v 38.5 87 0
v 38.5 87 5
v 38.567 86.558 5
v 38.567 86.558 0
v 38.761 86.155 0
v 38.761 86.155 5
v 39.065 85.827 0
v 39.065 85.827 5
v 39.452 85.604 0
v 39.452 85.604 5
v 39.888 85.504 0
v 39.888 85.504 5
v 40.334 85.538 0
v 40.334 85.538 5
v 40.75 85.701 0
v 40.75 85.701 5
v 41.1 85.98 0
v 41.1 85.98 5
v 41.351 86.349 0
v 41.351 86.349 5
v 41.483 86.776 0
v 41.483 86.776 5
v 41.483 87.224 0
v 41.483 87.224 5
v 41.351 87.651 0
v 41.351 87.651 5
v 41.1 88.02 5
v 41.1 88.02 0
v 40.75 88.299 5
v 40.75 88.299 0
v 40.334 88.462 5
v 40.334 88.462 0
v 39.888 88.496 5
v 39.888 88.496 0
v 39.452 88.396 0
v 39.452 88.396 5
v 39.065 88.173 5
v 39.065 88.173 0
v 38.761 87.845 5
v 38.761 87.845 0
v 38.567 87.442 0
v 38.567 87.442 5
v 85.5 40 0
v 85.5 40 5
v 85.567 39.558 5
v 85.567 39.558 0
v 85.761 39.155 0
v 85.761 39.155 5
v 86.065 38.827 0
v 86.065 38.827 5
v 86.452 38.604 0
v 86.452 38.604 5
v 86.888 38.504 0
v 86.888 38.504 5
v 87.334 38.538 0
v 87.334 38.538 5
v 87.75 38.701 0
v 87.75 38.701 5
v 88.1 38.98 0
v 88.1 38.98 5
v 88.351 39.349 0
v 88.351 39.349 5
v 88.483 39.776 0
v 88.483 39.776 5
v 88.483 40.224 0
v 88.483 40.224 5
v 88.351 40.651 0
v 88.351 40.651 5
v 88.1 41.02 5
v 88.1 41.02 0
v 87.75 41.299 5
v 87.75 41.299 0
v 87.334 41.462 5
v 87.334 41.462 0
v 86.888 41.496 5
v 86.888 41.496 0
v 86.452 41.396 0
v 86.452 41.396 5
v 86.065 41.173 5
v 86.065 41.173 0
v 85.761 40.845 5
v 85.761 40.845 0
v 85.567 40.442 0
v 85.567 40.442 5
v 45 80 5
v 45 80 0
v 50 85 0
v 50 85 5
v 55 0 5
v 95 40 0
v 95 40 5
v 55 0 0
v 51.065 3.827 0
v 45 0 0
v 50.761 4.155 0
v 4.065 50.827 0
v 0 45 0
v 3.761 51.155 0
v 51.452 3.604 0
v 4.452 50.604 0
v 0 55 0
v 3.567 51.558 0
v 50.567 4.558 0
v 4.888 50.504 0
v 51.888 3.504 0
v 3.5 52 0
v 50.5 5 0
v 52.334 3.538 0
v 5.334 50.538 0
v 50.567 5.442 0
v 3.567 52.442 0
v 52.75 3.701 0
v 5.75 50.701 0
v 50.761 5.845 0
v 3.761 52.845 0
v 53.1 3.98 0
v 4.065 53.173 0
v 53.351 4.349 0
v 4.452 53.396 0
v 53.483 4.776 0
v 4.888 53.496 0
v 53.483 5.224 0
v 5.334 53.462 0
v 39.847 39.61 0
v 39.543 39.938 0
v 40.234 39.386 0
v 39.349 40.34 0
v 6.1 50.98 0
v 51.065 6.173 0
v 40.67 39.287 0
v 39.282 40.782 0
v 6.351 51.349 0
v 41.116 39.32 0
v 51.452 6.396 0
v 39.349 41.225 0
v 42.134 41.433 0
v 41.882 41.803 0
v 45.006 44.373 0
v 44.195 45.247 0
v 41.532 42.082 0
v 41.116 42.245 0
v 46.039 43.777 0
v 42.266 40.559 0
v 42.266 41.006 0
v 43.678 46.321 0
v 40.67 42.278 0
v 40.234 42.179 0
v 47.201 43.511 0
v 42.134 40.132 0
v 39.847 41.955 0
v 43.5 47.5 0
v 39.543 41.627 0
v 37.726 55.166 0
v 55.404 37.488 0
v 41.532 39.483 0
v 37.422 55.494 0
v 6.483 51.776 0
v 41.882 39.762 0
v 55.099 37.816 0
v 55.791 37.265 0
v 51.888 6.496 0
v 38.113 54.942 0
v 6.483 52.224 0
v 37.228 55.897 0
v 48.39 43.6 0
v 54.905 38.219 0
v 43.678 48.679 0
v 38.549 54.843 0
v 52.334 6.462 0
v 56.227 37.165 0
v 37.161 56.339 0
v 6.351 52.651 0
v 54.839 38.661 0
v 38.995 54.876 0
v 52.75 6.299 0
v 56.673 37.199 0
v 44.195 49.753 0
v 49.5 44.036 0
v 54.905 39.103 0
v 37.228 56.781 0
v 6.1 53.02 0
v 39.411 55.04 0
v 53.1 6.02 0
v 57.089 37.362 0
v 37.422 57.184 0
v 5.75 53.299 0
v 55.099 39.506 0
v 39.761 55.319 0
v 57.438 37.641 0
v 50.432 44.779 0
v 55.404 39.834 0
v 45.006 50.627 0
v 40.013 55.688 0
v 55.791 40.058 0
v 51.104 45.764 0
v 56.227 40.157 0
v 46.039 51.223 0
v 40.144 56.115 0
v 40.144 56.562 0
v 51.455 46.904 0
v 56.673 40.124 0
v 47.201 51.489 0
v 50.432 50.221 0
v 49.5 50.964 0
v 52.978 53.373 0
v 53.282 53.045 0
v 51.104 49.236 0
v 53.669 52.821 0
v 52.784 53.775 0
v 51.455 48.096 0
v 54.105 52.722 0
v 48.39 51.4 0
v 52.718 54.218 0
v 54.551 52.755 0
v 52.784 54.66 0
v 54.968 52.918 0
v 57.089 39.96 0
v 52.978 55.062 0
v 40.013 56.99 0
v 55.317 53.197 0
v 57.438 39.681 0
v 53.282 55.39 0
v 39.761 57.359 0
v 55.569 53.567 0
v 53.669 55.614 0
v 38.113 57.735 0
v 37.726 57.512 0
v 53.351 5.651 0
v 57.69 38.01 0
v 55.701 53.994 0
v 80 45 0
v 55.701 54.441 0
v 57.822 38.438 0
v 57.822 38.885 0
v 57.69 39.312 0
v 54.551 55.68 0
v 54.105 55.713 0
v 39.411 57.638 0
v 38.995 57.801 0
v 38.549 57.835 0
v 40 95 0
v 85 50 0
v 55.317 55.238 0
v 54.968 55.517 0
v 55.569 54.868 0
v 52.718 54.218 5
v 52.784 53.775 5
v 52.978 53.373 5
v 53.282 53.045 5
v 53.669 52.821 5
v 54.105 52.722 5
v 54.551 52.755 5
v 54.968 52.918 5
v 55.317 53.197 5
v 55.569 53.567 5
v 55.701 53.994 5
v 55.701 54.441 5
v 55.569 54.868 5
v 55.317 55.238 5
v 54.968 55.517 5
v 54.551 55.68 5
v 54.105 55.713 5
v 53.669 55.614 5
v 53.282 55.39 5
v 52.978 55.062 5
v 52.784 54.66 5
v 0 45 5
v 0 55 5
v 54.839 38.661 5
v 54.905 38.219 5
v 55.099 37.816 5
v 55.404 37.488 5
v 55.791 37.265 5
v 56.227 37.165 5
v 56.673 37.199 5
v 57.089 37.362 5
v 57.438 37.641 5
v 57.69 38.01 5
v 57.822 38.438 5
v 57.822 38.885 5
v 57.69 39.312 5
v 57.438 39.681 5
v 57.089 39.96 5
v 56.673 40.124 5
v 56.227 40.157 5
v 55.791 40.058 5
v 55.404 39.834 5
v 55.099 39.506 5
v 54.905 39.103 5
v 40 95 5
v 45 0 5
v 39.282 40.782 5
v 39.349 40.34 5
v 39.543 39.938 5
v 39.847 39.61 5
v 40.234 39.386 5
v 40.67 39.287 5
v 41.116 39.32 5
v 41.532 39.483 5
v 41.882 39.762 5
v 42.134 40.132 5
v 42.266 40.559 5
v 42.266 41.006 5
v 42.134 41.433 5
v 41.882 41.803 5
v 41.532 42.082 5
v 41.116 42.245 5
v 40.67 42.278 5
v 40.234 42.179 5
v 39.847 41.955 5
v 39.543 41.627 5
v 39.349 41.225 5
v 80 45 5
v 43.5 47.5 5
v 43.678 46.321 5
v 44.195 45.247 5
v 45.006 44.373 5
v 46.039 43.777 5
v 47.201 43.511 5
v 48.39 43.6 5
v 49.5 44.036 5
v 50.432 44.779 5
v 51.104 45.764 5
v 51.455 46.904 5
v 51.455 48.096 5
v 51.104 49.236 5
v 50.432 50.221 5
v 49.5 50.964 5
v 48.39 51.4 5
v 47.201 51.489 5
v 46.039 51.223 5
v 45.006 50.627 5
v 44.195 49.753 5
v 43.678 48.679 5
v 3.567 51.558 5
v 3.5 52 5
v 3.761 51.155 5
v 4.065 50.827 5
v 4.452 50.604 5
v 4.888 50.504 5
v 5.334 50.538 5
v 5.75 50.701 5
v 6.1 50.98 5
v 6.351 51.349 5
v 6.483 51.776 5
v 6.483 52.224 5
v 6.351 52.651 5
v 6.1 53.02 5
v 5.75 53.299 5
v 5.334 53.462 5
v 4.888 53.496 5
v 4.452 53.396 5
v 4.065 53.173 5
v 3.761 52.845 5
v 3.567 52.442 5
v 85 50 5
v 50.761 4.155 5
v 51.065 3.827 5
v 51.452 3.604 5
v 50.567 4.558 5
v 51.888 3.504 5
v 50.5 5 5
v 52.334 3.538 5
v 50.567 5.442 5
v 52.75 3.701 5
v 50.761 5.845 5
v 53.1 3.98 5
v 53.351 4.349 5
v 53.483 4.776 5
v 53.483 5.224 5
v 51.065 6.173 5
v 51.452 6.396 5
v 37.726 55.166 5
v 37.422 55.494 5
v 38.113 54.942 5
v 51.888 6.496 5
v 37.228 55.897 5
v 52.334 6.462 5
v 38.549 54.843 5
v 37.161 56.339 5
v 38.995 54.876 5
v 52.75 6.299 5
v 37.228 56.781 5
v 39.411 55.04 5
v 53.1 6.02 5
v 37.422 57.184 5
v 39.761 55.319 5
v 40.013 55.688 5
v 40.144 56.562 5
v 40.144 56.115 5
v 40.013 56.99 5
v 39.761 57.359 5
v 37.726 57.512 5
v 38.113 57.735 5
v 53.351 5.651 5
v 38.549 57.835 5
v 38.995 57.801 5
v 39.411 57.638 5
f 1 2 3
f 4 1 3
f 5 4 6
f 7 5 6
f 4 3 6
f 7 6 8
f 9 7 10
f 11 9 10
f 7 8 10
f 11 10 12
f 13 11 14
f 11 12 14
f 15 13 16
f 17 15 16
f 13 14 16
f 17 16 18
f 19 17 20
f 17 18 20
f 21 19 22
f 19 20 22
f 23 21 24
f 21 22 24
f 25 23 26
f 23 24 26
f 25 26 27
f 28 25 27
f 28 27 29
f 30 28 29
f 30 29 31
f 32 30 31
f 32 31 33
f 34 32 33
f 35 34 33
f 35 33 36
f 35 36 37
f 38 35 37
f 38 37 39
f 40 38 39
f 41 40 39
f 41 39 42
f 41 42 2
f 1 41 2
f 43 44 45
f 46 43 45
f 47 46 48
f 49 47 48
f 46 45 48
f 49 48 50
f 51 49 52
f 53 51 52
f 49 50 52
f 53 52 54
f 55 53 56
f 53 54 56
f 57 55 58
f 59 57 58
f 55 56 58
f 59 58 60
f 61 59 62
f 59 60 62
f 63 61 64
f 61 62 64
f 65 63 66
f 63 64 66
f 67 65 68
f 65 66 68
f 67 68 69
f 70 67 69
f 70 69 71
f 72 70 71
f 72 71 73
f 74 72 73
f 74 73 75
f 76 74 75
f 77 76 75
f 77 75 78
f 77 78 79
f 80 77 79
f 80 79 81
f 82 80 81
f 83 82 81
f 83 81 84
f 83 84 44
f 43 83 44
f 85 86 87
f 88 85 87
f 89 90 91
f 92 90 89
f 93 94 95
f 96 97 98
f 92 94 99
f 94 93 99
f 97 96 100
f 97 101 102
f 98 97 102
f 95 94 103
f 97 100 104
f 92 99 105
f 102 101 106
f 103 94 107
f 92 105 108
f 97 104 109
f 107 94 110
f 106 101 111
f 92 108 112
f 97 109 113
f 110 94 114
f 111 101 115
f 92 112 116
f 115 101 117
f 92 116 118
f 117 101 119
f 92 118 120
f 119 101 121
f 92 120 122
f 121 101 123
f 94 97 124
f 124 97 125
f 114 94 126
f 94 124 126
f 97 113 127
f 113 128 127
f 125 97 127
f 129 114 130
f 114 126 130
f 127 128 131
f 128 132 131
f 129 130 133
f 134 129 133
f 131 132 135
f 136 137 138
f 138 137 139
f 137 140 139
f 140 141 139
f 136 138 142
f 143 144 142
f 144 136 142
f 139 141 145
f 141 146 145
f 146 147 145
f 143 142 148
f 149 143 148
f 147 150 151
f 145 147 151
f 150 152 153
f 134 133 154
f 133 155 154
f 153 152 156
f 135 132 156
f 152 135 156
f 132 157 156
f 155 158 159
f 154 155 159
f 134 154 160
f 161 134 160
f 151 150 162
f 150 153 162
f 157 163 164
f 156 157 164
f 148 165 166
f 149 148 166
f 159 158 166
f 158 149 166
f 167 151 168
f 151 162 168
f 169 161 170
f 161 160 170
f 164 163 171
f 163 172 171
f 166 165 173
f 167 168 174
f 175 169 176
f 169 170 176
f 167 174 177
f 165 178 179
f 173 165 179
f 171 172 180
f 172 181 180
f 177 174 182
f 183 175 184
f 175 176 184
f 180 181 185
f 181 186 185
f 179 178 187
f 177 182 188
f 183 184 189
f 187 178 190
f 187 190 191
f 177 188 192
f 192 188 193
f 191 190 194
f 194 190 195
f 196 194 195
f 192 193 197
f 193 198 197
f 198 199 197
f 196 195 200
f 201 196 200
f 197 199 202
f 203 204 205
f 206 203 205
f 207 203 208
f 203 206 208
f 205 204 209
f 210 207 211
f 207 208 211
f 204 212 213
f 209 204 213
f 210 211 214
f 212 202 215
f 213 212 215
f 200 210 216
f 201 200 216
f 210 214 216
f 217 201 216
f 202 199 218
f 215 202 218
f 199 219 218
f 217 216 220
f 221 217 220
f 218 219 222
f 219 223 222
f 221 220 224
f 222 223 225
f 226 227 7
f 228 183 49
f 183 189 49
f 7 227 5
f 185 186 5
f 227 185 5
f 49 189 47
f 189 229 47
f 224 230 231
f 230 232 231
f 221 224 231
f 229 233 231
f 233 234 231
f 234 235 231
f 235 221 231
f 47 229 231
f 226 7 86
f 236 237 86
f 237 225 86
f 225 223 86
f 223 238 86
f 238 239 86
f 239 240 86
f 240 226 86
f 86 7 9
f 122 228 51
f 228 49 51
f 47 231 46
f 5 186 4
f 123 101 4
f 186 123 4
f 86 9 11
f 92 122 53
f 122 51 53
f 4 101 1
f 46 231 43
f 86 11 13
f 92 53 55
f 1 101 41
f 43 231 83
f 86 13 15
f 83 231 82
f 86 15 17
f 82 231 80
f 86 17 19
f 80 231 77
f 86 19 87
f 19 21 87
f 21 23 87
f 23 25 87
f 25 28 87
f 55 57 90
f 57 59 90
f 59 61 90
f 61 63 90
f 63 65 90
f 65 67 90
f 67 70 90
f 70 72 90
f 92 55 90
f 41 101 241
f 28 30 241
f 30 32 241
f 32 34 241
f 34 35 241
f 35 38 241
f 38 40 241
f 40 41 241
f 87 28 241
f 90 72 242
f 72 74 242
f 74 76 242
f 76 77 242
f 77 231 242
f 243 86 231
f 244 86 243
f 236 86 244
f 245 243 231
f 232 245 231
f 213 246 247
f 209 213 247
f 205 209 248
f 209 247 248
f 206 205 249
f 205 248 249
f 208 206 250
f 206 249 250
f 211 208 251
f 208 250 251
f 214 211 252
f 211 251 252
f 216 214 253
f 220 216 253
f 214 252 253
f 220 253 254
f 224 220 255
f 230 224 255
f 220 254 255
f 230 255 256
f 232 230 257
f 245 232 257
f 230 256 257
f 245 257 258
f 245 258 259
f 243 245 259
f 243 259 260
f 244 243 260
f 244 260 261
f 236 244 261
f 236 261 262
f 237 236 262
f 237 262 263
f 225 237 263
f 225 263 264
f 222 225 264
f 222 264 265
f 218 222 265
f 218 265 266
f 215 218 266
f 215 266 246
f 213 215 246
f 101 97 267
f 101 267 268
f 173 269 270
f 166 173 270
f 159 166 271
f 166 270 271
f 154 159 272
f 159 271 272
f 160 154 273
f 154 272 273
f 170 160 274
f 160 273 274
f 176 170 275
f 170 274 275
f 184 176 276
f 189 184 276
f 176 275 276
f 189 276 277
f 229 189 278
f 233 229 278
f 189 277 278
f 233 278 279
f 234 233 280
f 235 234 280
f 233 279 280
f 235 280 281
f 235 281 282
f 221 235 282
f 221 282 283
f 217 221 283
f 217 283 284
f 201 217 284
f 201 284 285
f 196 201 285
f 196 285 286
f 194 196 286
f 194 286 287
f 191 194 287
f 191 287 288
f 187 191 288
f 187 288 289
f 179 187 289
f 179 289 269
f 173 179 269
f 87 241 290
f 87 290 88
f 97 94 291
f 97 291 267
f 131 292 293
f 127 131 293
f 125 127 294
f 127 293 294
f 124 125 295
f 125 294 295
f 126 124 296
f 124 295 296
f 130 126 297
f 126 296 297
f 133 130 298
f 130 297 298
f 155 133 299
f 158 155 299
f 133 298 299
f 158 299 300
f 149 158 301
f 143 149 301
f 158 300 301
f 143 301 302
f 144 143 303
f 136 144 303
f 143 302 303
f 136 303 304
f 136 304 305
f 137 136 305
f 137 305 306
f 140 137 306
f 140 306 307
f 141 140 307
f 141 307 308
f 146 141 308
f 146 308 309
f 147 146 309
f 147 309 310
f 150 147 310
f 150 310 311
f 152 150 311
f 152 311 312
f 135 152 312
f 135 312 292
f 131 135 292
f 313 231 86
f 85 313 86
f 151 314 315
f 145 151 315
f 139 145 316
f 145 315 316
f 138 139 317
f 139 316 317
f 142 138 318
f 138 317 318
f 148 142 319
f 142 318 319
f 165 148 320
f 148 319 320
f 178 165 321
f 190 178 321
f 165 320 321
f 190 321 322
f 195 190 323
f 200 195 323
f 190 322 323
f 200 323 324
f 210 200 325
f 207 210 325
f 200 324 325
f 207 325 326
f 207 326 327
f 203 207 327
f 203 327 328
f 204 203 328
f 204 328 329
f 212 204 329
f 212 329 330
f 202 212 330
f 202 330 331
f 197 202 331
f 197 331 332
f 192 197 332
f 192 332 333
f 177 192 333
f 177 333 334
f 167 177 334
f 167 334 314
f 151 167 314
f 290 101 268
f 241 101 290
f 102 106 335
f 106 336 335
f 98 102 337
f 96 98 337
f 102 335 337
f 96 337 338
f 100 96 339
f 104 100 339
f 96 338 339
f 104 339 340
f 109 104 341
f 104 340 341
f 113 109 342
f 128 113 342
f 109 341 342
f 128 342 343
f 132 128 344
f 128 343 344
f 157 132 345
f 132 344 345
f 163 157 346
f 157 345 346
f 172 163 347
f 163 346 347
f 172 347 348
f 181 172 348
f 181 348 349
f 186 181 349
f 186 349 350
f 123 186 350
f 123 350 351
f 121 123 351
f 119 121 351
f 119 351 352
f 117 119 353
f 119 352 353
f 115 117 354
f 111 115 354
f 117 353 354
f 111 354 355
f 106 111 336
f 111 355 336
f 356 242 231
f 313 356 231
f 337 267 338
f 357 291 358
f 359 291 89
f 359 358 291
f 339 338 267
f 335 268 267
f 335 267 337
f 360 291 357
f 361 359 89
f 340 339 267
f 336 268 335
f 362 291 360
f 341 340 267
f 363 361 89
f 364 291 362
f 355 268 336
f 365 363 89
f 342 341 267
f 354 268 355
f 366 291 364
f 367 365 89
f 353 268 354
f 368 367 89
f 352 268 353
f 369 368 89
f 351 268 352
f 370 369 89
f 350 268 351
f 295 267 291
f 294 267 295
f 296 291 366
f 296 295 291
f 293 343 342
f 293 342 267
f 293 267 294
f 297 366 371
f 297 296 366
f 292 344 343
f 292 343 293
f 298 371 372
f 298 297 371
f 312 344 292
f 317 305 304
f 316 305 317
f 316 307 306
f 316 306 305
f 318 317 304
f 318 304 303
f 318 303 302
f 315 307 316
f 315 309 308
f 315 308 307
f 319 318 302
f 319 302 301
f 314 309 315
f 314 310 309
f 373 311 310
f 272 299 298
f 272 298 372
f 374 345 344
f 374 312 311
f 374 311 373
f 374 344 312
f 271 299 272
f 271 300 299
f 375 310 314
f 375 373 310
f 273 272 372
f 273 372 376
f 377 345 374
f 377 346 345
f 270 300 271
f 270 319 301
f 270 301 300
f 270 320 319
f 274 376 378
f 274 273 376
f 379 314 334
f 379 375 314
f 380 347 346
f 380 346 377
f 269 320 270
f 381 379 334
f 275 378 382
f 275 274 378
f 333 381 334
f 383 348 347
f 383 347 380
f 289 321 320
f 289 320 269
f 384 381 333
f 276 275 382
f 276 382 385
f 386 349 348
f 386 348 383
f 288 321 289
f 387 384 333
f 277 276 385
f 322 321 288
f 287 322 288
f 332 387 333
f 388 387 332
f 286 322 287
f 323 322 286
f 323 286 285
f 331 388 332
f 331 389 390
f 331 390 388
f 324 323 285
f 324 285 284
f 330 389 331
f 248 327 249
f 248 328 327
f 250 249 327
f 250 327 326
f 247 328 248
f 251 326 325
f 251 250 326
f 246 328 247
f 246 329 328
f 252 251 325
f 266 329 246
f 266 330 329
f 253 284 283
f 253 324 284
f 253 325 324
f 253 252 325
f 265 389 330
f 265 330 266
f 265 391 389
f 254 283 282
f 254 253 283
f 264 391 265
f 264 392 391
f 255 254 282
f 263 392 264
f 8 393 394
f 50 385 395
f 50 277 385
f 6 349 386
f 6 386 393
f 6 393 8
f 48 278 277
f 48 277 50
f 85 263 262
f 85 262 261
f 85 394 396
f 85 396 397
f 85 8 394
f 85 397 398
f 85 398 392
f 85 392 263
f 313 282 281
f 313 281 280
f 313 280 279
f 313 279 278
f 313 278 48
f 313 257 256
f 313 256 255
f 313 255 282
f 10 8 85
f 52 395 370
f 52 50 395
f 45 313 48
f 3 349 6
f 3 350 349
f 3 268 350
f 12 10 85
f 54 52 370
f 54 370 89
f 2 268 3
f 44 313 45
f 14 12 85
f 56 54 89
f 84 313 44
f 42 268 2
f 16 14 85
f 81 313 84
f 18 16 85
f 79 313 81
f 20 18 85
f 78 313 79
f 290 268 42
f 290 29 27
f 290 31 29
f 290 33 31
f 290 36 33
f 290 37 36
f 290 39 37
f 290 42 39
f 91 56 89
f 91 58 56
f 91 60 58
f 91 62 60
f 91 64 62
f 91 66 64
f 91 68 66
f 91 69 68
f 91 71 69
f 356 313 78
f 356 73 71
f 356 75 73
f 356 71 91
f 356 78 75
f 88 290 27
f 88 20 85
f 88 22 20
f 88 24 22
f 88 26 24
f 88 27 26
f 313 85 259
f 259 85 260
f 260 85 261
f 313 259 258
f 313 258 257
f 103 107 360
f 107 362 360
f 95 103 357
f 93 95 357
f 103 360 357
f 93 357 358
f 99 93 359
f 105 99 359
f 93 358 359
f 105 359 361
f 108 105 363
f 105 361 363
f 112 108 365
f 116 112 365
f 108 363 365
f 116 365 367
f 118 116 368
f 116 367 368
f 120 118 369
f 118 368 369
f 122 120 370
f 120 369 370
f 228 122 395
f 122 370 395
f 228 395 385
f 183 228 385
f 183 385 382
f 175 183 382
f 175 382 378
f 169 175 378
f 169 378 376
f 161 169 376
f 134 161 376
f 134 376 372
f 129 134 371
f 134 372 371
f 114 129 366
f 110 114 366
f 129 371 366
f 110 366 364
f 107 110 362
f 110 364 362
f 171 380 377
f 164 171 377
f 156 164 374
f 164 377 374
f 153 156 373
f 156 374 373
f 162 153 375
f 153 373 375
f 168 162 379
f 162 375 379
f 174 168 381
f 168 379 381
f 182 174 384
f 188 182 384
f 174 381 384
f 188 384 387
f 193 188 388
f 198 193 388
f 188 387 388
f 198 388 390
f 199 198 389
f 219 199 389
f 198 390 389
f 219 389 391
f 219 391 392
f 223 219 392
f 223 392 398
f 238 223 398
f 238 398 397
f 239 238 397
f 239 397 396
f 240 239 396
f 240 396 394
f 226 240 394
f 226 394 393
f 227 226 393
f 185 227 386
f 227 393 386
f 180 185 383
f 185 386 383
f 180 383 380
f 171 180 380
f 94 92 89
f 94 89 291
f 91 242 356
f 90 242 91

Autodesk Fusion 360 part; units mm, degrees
sketch "スケッチ1" plane through (0, 0, 0) normal (0, 0, 1) x (1, 0, 0)
  line L0 (55, 0) -> (45, 0)
  line L1 (45, 0) -> (0, 45)
  line L2 (0, 45) -> (0, 55)
  line L3 (0, 55) -> (40, 95)
  line L4 (40, 95) -> (95, 40)
  line L5 (95, 40) -> (55, 0)
extrude "押し出し1" add sketch "スケッチ1" along normal blind 5
sketch "スケッチ2" plane through (0, 0, 5) normal (0, 0, 1) x (-1, 0, 0)
  line L0 (-95, -40) -> (-40, -95)
  line L1 (-40, -95) -> (0, -55)
  line L2 (0, -55) -> (0, -45)
  line L3 (0, -45) -> (-45, 0)
  line L4 (-45, 0) -> (-55, 0)
  line L5 (-55, 0) -> (-95, -40)
  line L6 (-55, -10) -> (-80, -35)
  line L7 (-80, -45) -> (-45, -80)
  line L8 (-35, -80) -> (-10, -55)
  line L9 (-10, -55) -> (-55, -10)
  line L10 (-35, -80) -> (-45, -80)
  line L11 (-80, -45) -> (-80, -35)
  line L12 (-62.5, -62.5) -> (-32.5, -32.5)
  circle A0 centre (-47.5, -47.5) radius 21.225
  circle A1 centre (-40.7825, -40.7825) radius 1.5
  circle A2 centre (-56.3388, -38.6612) radius 1.5
  circle A3 centre (-54.2175, -54.2175) radius 1.5
  circle A4 centre (-38.6612, -56.3388) radius 1.5
  line L13 (-38.6612, -56.3388) -> (-56.3388, -38.6612)
  circle A5 centre (-47.5, -47.5) radius 4
  point P0 (-47.5, -47.5)
  dimension "d4" = 3
  dimension "d11" = 19
  dimension "d12" = 12.5
  dimension "d13" = 12.5
  dimension "d14" = 3
  dimension "d15" = 3
  dimension "d16" = 3
  dimension "d17" = 8
sketch "スケッチ3" plane through (0, 0, 5) normal (0, 0, 1) x (-1, 0, 0)
  circle A0 centre (-5, -52) radius 1.5
  circle A1 centre (-52, -5) radius 1.5
  circle A2 centre (-40, -87) radius 1.5
  circle A3 centre (-87, -40) radius 1.5
extrude "押し出し2" cut sketch "スケッチ3" sketch "スケッチ2" against normal blind 5 of sketch 2 contours A2 | A4 | L12 A1 | L12 A1 | L12 A3 | L12 A3
sketch "スケッチ4" plane through (0, 0, 0) normal (0, 0, -1) x (1, 0, 0)
  line L0 (40, -95) -> (95, -40)
  line L1 (95, -40) -> (55, 0)
  line L2 (55, 0) -> (45, 0)
  line L3 (45, 0) -> (0, -45)
  line L4 (0, -45) -> (0, -55)
  line L5 (0, -55) -> (40, -95)
  circle A0 centre (38.6612, -56.3388) radius 1.5
  circle A1 centre (54.2175, -54.2175) radius 1.5
  circle A2 centre (87, -40) radius 1.5
  circle A3 centre (40, -87) radius 1.5
  circle A4 centre (52, -5) radius 1.5
  circle A5 centre (5, -52) radius 1.5
  circle A6 centre (40.7825, -40.7825) radius 1.5
  circle A7 centre (56.3388, -38.6612) radius 1.5
  line L6 (85, -50) -> (80, -45)
  line L7 (80, -45) -> (45, -80)
  line L8 (45, -80) -> (50, -85)
  line L9 (85, -50) -> (50, -85)
extrude "押し出し3" cut sketch "スケッチ4" against normal blind 5 contours L0 L6 L7 L8 L9
extrude "押し出し4" cut sketch "スケッチ2" against normal blind 12 contours L12 L13 A5 | L12 L13 A5 | L12 L13 A5 | L12 L13 A5
